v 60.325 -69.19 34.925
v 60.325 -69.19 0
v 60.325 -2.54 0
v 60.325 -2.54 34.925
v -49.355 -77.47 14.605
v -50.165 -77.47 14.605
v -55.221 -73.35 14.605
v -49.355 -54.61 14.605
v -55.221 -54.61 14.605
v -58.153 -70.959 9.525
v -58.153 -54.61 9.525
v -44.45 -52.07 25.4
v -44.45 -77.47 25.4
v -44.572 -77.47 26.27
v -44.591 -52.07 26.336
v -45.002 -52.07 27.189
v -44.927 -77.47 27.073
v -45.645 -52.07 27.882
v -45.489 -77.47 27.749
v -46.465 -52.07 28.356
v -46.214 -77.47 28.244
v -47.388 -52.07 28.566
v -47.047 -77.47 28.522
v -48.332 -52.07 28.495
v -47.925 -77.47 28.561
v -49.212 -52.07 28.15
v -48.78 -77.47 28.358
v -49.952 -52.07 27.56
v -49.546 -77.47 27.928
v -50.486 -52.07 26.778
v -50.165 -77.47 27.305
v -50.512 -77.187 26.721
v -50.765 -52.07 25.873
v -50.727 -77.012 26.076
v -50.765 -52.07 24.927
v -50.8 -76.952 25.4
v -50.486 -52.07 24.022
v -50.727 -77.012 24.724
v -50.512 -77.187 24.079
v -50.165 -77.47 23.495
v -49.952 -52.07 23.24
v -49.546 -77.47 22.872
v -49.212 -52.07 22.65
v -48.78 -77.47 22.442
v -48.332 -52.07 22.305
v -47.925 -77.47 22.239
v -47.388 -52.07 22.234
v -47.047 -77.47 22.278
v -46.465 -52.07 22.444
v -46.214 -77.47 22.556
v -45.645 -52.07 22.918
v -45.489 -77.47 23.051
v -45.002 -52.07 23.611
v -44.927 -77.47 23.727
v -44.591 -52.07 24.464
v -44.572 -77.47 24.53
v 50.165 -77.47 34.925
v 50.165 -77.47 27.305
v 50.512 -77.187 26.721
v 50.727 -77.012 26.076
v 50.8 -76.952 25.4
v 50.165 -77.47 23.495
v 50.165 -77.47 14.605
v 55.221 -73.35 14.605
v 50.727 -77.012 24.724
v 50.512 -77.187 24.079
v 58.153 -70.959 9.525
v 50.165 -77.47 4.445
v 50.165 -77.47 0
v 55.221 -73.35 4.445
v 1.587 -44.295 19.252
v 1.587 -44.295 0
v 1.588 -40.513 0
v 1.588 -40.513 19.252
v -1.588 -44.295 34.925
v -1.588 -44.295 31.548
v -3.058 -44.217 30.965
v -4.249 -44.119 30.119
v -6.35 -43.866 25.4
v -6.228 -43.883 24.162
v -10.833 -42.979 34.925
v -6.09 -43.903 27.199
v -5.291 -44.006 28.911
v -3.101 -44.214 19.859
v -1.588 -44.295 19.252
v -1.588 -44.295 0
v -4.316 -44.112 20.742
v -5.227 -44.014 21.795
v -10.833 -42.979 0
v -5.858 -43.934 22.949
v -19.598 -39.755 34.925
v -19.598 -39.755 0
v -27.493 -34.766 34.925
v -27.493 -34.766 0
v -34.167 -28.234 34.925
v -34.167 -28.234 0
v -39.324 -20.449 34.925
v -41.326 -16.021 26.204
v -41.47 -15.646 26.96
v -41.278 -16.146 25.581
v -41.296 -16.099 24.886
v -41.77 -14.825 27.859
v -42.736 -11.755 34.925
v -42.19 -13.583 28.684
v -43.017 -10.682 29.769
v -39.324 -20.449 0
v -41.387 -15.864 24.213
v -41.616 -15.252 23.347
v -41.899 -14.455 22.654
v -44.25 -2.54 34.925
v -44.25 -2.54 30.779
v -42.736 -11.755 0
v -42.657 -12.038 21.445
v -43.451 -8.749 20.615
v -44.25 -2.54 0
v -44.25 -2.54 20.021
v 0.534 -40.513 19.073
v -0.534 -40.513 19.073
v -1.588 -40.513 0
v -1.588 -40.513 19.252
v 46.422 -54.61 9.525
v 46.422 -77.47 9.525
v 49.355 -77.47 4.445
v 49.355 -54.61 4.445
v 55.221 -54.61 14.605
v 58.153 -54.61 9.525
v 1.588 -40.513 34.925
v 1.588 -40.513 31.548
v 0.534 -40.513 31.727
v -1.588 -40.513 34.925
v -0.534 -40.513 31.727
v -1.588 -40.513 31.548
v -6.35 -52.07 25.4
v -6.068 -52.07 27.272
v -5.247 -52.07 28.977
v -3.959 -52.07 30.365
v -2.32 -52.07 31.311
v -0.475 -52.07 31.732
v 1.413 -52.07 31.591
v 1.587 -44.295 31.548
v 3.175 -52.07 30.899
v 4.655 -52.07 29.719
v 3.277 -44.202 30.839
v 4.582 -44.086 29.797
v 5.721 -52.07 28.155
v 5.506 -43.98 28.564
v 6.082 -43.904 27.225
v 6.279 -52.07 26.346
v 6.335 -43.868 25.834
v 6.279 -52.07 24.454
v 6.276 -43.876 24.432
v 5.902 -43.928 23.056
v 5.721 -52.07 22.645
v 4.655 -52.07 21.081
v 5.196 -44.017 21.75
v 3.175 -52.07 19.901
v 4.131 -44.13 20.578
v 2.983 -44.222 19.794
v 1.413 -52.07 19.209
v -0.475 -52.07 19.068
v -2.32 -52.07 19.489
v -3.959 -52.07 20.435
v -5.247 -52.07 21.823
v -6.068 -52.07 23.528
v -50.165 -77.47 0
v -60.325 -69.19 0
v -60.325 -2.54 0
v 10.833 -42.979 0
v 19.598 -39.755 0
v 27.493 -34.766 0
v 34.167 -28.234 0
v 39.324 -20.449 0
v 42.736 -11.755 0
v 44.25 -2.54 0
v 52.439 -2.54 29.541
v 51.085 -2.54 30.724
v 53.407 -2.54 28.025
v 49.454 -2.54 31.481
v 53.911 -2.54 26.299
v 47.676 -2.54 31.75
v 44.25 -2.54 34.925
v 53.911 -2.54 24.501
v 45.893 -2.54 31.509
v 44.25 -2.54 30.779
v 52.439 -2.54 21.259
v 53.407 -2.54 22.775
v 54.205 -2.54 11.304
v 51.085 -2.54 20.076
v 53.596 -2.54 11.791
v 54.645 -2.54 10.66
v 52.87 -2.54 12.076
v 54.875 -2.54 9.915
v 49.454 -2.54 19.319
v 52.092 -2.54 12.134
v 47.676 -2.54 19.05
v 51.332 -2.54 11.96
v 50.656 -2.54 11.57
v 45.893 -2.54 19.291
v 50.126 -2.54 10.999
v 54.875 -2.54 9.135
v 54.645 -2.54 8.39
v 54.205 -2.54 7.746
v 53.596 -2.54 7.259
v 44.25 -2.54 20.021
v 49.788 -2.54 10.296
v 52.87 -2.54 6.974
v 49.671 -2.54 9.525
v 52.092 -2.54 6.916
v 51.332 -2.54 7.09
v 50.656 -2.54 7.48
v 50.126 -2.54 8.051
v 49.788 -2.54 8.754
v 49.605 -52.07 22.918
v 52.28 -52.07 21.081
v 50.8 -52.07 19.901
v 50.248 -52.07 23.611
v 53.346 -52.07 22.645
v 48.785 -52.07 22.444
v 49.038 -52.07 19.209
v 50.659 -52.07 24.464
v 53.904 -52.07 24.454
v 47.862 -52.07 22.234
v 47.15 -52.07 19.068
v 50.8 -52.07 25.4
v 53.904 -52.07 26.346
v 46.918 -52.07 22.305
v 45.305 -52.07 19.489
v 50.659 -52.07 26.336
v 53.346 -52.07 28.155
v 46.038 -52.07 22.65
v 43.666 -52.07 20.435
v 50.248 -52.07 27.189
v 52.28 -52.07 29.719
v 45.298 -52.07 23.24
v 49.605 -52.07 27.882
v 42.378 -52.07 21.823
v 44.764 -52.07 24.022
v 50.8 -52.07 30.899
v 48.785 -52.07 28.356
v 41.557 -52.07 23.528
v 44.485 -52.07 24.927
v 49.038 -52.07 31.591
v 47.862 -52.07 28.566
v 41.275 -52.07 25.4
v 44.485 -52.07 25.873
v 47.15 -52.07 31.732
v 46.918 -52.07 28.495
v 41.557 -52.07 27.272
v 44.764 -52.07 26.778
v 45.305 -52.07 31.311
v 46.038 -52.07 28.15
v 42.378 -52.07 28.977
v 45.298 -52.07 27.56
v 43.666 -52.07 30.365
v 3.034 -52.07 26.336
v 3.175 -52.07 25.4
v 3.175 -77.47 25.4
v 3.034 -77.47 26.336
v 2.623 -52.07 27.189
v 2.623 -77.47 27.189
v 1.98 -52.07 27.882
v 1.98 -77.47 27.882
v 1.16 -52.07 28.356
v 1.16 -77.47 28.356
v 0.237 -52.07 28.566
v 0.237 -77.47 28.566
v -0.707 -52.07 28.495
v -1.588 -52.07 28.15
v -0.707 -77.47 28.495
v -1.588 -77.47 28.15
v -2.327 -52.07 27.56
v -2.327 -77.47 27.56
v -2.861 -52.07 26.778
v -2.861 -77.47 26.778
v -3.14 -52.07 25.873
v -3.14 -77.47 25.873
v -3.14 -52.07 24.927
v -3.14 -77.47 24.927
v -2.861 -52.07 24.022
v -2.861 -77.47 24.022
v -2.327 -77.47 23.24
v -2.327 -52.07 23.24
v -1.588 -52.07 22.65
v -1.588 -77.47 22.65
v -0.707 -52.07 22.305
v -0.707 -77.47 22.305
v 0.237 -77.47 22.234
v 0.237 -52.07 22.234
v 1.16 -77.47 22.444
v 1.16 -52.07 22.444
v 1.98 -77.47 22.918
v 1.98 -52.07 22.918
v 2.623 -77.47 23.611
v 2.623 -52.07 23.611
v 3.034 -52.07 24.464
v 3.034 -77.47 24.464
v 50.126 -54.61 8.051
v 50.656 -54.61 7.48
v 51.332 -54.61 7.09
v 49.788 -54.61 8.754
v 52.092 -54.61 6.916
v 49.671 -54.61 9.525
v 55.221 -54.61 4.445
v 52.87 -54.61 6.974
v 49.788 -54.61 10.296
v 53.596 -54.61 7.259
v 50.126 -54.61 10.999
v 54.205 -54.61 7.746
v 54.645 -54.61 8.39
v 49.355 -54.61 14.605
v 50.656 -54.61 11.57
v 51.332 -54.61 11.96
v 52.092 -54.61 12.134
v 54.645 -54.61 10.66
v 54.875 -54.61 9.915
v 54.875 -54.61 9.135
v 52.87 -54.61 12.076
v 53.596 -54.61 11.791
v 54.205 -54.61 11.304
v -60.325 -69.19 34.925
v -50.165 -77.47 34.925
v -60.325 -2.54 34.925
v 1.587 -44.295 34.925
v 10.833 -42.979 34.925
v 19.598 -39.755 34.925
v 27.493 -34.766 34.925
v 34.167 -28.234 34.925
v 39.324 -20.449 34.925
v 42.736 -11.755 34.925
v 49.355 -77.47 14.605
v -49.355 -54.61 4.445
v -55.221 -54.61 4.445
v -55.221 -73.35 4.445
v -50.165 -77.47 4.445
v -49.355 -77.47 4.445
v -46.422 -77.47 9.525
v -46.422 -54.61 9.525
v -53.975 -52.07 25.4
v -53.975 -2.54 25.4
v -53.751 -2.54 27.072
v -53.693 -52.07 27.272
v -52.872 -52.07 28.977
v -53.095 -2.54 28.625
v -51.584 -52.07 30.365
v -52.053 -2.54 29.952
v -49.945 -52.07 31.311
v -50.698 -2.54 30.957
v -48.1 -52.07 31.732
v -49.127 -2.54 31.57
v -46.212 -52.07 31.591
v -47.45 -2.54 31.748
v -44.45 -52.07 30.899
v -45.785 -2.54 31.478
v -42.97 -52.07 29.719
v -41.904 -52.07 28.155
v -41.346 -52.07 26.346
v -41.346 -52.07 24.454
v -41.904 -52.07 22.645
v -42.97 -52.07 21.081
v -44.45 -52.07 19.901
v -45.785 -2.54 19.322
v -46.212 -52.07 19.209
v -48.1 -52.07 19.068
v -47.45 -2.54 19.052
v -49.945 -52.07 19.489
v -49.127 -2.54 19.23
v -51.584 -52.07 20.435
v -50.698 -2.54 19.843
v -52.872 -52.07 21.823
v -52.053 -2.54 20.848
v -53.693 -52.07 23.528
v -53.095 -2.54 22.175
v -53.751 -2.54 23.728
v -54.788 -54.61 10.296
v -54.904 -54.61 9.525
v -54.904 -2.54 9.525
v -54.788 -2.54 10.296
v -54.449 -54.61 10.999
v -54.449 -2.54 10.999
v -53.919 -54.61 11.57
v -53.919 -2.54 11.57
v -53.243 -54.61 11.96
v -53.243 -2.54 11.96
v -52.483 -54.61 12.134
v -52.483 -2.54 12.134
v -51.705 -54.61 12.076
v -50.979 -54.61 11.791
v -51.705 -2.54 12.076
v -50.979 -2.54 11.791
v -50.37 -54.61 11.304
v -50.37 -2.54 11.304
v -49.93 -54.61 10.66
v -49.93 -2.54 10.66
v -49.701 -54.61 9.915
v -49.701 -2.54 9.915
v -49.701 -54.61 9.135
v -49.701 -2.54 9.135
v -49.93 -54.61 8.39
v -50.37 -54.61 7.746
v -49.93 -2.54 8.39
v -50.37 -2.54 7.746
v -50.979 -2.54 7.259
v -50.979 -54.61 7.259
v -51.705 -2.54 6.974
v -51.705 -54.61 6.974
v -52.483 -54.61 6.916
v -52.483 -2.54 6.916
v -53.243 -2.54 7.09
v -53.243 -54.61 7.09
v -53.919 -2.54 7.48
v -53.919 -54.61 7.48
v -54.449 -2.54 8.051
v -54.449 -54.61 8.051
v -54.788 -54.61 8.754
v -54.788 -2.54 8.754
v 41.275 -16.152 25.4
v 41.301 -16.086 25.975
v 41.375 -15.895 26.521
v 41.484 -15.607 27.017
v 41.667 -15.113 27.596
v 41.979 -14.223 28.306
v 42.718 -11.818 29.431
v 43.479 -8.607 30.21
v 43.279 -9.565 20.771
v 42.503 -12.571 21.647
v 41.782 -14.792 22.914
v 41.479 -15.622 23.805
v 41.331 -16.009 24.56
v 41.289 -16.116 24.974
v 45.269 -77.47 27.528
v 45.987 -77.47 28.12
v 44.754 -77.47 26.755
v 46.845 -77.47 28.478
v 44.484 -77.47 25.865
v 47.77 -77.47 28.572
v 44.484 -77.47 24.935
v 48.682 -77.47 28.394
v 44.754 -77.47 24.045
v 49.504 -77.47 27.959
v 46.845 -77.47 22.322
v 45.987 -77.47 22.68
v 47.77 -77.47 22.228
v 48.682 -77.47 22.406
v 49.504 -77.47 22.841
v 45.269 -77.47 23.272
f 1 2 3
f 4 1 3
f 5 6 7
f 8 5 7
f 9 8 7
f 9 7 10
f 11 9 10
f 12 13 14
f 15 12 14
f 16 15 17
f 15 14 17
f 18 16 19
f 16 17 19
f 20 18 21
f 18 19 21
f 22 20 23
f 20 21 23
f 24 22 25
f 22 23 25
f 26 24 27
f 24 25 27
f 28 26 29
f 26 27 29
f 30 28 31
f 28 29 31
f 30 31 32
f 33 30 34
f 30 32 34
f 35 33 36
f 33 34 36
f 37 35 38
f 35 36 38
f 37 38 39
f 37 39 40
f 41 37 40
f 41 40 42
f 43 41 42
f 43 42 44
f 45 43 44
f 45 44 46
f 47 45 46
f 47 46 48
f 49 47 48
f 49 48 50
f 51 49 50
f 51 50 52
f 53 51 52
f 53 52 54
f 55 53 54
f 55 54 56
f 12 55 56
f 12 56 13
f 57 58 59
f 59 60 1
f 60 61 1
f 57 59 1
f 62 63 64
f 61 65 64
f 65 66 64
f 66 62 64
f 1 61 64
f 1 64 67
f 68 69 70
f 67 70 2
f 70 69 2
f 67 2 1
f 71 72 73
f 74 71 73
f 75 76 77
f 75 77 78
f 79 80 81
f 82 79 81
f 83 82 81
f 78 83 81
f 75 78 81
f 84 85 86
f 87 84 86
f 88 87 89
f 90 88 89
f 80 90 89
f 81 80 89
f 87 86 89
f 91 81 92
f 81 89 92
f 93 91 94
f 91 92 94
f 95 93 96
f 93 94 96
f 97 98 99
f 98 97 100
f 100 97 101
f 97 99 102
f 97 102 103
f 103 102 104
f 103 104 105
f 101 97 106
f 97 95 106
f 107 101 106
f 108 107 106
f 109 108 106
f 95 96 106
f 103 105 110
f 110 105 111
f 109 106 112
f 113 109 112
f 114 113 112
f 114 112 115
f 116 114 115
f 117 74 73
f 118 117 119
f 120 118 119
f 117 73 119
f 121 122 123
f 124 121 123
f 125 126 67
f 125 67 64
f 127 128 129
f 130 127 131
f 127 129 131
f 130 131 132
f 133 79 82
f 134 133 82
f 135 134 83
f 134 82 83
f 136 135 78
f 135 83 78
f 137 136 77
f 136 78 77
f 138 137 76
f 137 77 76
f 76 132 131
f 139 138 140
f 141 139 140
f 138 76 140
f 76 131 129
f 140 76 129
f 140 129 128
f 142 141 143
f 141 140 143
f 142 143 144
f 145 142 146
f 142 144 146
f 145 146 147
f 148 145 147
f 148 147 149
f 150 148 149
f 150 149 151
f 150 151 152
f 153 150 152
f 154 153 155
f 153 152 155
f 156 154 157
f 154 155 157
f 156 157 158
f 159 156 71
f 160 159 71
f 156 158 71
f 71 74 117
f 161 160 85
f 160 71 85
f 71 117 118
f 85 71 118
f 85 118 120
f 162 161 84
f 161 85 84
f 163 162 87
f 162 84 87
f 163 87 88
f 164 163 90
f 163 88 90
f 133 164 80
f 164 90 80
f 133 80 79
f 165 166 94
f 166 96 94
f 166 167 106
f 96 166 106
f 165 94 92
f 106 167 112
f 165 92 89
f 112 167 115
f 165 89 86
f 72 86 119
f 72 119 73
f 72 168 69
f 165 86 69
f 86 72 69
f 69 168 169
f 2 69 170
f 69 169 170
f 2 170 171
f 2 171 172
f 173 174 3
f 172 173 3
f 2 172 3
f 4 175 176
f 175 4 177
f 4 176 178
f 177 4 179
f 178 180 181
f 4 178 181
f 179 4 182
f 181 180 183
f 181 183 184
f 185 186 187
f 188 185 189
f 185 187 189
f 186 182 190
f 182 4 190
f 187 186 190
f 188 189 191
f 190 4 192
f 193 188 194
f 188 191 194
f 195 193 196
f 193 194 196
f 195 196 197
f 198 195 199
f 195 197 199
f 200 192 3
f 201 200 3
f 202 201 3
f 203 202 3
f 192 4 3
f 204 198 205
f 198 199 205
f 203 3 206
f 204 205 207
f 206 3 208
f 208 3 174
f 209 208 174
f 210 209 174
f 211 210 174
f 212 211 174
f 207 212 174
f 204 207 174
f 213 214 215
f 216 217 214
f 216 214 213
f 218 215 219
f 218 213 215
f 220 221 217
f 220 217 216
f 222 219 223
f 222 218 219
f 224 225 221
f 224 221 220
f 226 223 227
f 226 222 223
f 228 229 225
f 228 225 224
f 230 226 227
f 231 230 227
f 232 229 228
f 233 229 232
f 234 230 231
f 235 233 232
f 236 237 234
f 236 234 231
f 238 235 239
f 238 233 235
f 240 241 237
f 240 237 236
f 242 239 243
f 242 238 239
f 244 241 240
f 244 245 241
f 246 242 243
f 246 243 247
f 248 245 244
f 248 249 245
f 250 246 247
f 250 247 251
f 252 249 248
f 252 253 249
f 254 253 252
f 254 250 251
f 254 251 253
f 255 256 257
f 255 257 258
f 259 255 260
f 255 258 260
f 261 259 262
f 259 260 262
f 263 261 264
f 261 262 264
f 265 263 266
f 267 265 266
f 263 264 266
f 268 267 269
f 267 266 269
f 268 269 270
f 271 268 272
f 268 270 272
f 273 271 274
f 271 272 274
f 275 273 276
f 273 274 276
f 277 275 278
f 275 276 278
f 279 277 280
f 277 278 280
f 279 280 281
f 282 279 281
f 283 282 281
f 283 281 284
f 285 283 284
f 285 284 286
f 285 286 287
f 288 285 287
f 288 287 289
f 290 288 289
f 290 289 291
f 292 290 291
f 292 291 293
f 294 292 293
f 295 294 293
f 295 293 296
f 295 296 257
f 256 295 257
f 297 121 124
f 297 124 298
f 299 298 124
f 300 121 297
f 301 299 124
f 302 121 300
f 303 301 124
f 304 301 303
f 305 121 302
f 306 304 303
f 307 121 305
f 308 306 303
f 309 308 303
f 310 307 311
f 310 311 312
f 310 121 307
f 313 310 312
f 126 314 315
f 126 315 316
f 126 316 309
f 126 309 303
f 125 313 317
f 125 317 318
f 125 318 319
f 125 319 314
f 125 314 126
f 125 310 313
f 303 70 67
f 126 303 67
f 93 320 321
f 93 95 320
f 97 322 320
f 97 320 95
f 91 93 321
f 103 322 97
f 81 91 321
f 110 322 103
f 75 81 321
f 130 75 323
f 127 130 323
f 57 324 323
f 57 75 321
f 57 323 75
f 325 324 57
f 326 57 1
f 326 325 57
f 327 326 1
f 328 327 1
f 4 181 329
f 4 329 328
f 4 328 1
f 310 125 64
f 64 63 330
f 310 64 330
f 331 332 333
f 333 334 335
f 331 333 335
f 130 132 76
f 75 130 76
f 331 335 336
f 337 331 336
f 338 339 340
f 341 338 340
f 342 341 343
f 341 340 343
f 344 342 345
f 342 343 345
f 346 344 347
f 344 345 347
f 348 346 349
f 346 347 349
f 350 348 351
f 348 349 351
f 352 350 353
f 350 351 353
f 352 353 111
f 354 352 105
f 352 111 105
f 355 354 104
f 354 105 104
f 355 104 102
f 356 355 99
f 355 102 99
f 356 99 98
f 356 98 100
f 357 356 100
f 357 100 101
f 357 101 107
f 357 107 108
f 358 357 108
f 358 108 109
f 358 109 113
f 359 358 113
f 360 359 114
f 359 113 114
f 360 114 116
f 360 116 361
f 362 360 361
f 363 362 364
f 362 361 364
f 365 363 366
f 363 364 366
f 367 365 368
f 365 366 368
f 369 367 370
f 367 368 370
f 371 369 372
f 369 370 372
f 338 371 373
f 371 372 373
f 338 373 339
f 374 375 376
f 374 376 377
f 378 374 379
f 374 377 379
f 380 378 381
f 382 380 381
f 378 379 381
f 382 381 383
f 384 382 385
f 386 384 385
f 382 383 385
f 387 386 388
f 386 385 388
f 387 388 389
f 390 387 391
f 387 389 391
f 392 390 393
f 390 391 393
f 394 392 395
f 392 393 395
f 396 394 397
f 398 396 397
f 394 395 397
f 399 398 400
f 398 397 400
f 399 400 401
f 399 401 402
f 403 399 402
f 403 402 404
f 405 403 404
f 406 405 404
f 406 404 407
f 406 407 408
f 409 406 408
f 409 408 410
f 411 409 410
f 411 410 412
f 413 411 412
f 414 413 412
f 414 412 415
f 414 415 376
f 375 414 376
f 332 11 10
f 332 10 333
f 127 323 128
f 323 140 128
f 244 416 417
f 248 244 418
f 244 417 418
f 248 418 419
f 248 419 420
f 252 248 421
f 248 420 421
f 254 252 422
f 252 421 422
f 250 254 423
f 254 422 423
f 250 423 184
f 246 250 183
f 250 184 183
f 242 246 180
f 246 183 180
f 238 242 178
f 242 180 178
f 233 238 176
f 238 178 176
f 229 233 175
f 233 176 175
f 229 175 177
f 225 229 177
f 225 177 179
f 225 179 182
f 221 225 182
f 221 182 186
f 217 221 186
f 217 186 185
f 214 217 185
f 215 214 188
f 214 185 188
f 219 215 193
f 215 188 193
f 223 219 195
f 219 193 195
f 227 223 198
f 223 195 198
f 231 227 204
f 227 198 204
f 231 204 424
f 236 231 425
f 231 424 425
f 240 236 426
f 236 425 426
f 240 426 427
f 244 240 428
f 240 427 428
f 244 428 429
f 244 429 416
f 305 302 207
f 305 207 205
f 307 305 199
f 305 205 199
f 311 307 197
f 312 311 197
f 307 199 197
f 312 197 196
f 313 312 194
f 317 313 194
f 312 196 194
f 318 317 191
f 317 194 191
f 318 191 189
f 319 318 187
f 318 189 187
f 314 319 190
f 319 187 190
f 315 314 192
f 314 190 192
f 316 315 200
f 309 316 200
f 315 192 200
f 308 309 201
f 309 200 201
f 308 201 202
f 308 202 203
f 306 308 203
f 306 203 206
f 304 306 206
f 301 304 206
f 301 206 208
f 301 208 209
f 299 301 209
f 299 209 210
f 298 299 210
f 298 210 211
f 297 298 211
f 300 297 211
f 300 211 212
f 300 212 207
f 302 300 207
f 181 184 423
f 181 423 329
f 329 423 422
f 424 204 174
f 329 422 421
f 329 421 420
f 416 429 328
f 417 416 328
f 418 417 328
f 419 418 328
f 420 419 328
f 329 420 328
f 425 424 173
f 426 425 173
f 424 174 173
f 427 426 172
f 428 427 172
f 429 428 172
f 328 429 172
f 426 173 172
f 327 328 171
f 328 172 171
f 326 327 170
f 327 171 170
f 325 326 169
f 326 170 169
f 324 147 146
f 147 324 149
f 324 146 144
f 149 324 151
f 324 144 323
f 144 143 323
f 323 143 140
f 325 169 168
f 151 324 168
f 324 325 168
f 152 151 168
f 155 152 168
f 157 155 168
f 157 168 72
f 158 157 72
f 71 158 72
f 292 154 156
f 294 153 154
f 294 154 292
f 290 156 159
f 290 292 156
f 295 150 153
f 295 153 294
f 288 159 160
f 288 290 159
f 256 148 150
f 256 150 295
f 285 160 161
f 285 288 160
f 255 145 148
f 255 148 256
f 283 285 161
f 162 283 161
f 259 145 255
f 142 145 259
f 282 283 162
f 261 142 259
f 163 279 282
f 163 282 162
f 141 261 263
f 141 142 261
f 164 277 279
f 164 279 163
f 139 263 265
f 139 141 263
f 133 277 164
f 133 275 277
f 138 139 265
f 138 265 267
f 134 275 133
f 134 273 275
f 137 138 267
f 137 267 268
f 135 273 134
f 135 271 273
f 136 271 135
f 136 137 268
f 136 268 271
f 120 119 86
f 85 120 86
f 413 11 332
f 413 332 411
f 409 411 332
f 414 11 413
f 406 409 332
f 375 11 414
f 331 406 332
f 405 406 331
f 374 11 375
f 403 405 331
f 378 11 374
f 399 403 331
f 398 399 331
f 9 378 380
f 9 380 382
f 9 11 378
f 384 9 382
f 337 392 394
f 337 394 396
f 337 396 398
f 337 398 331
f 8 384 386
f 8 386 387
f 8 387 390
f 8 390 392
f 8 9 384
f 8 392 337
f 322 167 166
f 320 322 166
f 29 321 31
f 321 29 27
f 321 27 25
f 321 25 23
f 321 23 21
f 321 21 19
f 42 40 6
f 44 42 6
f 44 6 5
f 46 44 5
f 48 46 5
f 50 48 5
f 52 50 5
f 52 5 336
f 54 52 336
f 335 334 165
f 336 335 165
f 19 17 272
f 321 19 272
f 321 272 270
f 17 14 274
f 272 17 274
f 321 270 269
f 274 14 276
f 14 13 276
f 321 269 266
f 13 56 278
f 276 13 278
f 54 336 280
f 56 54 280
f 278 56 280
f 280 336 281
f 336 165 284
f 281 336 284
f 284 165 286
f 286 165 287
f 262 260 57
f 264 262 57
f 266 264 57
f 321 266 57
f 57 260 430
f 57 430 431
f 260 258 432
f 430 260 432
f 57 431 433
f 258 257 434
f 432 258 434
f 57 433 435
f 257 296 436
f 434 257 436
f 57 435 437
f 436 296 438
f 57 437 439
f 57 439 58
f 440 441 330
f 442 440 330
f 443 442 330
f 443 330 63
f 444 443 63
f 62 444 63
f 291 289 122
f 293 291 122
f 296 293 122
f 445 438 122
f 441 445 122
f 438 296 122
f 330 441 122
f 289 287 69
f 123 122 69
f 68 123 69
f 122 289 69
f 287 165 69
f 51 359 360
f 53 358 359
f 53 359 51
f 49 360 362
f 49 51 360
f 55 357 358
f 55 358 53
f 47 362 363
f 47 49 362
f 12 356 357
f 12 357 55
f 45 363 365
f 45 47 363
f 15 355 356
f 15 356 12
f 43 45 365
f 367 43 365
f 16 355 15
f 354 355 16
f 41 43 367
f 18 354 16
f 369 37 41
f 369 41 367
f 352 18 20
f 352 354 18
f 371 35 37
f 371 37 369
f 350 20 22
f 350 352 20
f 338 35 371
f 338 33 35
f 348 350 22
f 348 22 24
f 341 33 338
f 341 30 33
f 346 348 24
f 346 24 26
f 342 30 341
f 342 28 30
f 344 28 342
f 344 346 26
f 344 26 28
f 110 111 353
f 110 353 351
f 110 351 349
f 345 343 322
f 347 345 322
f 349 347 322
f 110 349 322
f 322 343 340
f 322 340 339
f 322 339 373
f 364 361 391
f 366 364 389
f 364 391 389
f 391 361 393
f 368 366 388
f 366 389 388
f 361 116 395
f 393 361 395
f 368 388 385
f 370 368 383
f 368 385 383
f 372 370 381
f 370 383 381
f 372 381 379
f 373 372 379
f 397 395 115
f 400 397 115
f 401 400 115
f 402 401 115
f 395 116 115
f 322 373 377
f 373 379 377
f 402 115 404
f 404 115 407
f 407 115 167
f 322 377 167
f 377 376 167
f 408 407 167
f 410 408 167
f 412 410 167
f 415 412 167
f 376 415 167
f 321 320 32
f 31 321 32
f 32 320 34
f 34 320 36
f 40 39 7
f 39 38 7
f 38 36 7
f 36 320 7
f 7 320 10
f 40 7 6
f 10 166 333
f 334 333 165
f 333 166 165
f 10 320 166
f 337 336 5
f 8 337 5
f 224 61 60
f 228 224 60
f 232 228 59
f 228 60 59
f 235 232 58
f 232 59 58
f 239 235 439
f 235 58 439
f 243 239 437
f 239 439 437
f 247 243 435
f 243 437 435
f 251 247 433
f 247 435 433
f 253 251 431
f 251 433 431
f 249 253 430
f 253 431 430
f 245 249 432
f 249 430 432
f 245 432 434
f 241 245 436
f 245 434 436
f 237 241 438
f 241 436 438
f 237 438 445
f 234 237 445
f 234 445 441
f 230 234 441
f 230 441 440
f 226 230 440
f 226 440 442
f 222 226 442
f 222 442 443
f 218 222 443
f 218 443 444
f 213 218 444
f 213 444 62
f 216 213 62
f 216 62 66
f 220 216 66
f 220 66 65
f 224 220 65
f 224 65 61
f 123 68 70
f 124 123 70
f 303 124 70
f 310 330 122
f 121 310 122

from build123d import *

# Parameters (mm, degrees)
F1_DEPTH  = 34.925
F2_R      = 2.6162
F3_DEPTH  = 74.931
F4_R      = 2.6162
F5_DEPTH  = 74.931
F6_R      = 3.175
F7_DEPTH  = 74.931
F8_R      = 6.35
F9_DEPTH  = 49.53
F11_DEPTH = 22.86
F13_DEPTH = 2.54


with BuildPart() as f1:
    # F0 (on Top) → F1 (new body)
    with BuildSketch(Plane.XY):
        with BuildLine():
            ThreePointArc((-1.5875, -44.2945614354), (-31.002155354, -31.6764059262), (-44.2501607794, -2.54))
            Line((-44.2501607794, -2.54), (-60.325, -2.54))
            Line((-60.325, -2.54), (-60.325, -69.1896))
            Line((-60.325, -69.1896), (-50.165, -77.47))
            Line((-50.165, -77.47), (-1.5875, -77.47))
            Line((-1.5875, -77.47), (-1.5875, -44.2945614354))
        make_face()
        Polygon((-1.5875, -40.513), (-1.5875, -44.2945614354), (-1.5875, -77.47), (1.5875, -77.47), (1.5875, -44.2945614354), (1.5875, -40.513), align=None)
        with BuildLine():
            Line((1.5875, -44.2945614354), (1.5875, -77.47))
            Line((1.5875, -77.47), (50.165, -77.47))
            Line((50.165, -77.47), (60.325, -69.1896))
            Line((60.325, -69.1896), (60.325, -2.54))
            Line((60.325, -2.54), (44.2501607794, -2.54))
            ThreePointArc((44.2501607794, -2.54), (31.002155354, -31.6764059262), (1.5875, -44.2945614354))
        make_face()
    extrude(amount=F1_DEPTH)

    # F2 (on face) → F3 (cut, through all)
    with BuildSketch(Plane(origin=(0, -2.54, 0), x_dir=(-1, 0, 0), z_dir=(0, 1, 0))):
        with Locations((-52.2875803897, 9.525)):
            Circle(F2_R)
    extrude(amount=-F3_DEPTH, mode=Mode.SUBTRACT)

    # F4 (on face) → F5 (cut, through all)
    with BuildSketch(Plane(origin=(0, -2.54, 0), x_dir=(-1, 0, 0), z_dir=(0, 1, 0))):
        with Locations((52.2875803897, 9.525)):
            Circle(F4_R)
    extrude(amount=-F5_DEPTH, mode=Mode.SUBTRACT)

    # F6 (on face) → F7 (cut, through all)
    with BuildSketch(Plane.XZ.offset(77.47)):
        with Locations((-47.625, 25.4)):
            Circle(F6_R)
        with Locations((47.625, 25.4)):
            Circle(F6_R)
        with Locations((0, 25.4)):
            Circle(F6_R)
    extrude(amount=-F7_DEPTH, mode=Mode.SUBTRACT)

    # F8 (on face) → F9 (cut)
    with BuildSketch(Plane(origin=(0, -2.54, 0), x_dir=(-1, 0, 0), z_dir=(0, 1, 0))):
        with Locations((-47.625, 25.4)):
            Circle(F8_R)
        with Locations((0, 25.4)):
            Circle(F8_R)
        with Locations((47.625, 25.4)):
            Circle(F8_R)
    extrude(amount=-F9_DEPTH, mode=Mode.SUBTRACT)

    # F10 (on face) → F11 (cut)
    with BuildSketch(Plane.XZ.offset(77.47)):
        Polygon((-49.3546410222, 4.445), (-46.4217016547, 9.525), (-49.3546410222, 14.605), (-55.2205197572, 14.605), (-58.1534591247, 9.525), (-55.2205197572, 4.445), align=None)
        Polygon((49.3546410222, 14.605), (46.4217016547, 9.525), (49.3546410222, 4.445), (55.2205197572, 4.445), (58.1534591247, 9.525), (55.2205197572, 14.605), align=None)
    extrude(amount=-F11_DEPTH, mode=Mode.SUBTRACT)

    # F12 (on face) → F13 (join)
    with BuildSketch(Plane.XY.offset(34.925)):
        Polygon((-1.5875, -41.783), (-1.5875, -44.323), (1.5875, -44.2945614354), (1.5875, -41.783), align=None)
    extrude(amount=-F13_DEPTH)


solid = f1.part
